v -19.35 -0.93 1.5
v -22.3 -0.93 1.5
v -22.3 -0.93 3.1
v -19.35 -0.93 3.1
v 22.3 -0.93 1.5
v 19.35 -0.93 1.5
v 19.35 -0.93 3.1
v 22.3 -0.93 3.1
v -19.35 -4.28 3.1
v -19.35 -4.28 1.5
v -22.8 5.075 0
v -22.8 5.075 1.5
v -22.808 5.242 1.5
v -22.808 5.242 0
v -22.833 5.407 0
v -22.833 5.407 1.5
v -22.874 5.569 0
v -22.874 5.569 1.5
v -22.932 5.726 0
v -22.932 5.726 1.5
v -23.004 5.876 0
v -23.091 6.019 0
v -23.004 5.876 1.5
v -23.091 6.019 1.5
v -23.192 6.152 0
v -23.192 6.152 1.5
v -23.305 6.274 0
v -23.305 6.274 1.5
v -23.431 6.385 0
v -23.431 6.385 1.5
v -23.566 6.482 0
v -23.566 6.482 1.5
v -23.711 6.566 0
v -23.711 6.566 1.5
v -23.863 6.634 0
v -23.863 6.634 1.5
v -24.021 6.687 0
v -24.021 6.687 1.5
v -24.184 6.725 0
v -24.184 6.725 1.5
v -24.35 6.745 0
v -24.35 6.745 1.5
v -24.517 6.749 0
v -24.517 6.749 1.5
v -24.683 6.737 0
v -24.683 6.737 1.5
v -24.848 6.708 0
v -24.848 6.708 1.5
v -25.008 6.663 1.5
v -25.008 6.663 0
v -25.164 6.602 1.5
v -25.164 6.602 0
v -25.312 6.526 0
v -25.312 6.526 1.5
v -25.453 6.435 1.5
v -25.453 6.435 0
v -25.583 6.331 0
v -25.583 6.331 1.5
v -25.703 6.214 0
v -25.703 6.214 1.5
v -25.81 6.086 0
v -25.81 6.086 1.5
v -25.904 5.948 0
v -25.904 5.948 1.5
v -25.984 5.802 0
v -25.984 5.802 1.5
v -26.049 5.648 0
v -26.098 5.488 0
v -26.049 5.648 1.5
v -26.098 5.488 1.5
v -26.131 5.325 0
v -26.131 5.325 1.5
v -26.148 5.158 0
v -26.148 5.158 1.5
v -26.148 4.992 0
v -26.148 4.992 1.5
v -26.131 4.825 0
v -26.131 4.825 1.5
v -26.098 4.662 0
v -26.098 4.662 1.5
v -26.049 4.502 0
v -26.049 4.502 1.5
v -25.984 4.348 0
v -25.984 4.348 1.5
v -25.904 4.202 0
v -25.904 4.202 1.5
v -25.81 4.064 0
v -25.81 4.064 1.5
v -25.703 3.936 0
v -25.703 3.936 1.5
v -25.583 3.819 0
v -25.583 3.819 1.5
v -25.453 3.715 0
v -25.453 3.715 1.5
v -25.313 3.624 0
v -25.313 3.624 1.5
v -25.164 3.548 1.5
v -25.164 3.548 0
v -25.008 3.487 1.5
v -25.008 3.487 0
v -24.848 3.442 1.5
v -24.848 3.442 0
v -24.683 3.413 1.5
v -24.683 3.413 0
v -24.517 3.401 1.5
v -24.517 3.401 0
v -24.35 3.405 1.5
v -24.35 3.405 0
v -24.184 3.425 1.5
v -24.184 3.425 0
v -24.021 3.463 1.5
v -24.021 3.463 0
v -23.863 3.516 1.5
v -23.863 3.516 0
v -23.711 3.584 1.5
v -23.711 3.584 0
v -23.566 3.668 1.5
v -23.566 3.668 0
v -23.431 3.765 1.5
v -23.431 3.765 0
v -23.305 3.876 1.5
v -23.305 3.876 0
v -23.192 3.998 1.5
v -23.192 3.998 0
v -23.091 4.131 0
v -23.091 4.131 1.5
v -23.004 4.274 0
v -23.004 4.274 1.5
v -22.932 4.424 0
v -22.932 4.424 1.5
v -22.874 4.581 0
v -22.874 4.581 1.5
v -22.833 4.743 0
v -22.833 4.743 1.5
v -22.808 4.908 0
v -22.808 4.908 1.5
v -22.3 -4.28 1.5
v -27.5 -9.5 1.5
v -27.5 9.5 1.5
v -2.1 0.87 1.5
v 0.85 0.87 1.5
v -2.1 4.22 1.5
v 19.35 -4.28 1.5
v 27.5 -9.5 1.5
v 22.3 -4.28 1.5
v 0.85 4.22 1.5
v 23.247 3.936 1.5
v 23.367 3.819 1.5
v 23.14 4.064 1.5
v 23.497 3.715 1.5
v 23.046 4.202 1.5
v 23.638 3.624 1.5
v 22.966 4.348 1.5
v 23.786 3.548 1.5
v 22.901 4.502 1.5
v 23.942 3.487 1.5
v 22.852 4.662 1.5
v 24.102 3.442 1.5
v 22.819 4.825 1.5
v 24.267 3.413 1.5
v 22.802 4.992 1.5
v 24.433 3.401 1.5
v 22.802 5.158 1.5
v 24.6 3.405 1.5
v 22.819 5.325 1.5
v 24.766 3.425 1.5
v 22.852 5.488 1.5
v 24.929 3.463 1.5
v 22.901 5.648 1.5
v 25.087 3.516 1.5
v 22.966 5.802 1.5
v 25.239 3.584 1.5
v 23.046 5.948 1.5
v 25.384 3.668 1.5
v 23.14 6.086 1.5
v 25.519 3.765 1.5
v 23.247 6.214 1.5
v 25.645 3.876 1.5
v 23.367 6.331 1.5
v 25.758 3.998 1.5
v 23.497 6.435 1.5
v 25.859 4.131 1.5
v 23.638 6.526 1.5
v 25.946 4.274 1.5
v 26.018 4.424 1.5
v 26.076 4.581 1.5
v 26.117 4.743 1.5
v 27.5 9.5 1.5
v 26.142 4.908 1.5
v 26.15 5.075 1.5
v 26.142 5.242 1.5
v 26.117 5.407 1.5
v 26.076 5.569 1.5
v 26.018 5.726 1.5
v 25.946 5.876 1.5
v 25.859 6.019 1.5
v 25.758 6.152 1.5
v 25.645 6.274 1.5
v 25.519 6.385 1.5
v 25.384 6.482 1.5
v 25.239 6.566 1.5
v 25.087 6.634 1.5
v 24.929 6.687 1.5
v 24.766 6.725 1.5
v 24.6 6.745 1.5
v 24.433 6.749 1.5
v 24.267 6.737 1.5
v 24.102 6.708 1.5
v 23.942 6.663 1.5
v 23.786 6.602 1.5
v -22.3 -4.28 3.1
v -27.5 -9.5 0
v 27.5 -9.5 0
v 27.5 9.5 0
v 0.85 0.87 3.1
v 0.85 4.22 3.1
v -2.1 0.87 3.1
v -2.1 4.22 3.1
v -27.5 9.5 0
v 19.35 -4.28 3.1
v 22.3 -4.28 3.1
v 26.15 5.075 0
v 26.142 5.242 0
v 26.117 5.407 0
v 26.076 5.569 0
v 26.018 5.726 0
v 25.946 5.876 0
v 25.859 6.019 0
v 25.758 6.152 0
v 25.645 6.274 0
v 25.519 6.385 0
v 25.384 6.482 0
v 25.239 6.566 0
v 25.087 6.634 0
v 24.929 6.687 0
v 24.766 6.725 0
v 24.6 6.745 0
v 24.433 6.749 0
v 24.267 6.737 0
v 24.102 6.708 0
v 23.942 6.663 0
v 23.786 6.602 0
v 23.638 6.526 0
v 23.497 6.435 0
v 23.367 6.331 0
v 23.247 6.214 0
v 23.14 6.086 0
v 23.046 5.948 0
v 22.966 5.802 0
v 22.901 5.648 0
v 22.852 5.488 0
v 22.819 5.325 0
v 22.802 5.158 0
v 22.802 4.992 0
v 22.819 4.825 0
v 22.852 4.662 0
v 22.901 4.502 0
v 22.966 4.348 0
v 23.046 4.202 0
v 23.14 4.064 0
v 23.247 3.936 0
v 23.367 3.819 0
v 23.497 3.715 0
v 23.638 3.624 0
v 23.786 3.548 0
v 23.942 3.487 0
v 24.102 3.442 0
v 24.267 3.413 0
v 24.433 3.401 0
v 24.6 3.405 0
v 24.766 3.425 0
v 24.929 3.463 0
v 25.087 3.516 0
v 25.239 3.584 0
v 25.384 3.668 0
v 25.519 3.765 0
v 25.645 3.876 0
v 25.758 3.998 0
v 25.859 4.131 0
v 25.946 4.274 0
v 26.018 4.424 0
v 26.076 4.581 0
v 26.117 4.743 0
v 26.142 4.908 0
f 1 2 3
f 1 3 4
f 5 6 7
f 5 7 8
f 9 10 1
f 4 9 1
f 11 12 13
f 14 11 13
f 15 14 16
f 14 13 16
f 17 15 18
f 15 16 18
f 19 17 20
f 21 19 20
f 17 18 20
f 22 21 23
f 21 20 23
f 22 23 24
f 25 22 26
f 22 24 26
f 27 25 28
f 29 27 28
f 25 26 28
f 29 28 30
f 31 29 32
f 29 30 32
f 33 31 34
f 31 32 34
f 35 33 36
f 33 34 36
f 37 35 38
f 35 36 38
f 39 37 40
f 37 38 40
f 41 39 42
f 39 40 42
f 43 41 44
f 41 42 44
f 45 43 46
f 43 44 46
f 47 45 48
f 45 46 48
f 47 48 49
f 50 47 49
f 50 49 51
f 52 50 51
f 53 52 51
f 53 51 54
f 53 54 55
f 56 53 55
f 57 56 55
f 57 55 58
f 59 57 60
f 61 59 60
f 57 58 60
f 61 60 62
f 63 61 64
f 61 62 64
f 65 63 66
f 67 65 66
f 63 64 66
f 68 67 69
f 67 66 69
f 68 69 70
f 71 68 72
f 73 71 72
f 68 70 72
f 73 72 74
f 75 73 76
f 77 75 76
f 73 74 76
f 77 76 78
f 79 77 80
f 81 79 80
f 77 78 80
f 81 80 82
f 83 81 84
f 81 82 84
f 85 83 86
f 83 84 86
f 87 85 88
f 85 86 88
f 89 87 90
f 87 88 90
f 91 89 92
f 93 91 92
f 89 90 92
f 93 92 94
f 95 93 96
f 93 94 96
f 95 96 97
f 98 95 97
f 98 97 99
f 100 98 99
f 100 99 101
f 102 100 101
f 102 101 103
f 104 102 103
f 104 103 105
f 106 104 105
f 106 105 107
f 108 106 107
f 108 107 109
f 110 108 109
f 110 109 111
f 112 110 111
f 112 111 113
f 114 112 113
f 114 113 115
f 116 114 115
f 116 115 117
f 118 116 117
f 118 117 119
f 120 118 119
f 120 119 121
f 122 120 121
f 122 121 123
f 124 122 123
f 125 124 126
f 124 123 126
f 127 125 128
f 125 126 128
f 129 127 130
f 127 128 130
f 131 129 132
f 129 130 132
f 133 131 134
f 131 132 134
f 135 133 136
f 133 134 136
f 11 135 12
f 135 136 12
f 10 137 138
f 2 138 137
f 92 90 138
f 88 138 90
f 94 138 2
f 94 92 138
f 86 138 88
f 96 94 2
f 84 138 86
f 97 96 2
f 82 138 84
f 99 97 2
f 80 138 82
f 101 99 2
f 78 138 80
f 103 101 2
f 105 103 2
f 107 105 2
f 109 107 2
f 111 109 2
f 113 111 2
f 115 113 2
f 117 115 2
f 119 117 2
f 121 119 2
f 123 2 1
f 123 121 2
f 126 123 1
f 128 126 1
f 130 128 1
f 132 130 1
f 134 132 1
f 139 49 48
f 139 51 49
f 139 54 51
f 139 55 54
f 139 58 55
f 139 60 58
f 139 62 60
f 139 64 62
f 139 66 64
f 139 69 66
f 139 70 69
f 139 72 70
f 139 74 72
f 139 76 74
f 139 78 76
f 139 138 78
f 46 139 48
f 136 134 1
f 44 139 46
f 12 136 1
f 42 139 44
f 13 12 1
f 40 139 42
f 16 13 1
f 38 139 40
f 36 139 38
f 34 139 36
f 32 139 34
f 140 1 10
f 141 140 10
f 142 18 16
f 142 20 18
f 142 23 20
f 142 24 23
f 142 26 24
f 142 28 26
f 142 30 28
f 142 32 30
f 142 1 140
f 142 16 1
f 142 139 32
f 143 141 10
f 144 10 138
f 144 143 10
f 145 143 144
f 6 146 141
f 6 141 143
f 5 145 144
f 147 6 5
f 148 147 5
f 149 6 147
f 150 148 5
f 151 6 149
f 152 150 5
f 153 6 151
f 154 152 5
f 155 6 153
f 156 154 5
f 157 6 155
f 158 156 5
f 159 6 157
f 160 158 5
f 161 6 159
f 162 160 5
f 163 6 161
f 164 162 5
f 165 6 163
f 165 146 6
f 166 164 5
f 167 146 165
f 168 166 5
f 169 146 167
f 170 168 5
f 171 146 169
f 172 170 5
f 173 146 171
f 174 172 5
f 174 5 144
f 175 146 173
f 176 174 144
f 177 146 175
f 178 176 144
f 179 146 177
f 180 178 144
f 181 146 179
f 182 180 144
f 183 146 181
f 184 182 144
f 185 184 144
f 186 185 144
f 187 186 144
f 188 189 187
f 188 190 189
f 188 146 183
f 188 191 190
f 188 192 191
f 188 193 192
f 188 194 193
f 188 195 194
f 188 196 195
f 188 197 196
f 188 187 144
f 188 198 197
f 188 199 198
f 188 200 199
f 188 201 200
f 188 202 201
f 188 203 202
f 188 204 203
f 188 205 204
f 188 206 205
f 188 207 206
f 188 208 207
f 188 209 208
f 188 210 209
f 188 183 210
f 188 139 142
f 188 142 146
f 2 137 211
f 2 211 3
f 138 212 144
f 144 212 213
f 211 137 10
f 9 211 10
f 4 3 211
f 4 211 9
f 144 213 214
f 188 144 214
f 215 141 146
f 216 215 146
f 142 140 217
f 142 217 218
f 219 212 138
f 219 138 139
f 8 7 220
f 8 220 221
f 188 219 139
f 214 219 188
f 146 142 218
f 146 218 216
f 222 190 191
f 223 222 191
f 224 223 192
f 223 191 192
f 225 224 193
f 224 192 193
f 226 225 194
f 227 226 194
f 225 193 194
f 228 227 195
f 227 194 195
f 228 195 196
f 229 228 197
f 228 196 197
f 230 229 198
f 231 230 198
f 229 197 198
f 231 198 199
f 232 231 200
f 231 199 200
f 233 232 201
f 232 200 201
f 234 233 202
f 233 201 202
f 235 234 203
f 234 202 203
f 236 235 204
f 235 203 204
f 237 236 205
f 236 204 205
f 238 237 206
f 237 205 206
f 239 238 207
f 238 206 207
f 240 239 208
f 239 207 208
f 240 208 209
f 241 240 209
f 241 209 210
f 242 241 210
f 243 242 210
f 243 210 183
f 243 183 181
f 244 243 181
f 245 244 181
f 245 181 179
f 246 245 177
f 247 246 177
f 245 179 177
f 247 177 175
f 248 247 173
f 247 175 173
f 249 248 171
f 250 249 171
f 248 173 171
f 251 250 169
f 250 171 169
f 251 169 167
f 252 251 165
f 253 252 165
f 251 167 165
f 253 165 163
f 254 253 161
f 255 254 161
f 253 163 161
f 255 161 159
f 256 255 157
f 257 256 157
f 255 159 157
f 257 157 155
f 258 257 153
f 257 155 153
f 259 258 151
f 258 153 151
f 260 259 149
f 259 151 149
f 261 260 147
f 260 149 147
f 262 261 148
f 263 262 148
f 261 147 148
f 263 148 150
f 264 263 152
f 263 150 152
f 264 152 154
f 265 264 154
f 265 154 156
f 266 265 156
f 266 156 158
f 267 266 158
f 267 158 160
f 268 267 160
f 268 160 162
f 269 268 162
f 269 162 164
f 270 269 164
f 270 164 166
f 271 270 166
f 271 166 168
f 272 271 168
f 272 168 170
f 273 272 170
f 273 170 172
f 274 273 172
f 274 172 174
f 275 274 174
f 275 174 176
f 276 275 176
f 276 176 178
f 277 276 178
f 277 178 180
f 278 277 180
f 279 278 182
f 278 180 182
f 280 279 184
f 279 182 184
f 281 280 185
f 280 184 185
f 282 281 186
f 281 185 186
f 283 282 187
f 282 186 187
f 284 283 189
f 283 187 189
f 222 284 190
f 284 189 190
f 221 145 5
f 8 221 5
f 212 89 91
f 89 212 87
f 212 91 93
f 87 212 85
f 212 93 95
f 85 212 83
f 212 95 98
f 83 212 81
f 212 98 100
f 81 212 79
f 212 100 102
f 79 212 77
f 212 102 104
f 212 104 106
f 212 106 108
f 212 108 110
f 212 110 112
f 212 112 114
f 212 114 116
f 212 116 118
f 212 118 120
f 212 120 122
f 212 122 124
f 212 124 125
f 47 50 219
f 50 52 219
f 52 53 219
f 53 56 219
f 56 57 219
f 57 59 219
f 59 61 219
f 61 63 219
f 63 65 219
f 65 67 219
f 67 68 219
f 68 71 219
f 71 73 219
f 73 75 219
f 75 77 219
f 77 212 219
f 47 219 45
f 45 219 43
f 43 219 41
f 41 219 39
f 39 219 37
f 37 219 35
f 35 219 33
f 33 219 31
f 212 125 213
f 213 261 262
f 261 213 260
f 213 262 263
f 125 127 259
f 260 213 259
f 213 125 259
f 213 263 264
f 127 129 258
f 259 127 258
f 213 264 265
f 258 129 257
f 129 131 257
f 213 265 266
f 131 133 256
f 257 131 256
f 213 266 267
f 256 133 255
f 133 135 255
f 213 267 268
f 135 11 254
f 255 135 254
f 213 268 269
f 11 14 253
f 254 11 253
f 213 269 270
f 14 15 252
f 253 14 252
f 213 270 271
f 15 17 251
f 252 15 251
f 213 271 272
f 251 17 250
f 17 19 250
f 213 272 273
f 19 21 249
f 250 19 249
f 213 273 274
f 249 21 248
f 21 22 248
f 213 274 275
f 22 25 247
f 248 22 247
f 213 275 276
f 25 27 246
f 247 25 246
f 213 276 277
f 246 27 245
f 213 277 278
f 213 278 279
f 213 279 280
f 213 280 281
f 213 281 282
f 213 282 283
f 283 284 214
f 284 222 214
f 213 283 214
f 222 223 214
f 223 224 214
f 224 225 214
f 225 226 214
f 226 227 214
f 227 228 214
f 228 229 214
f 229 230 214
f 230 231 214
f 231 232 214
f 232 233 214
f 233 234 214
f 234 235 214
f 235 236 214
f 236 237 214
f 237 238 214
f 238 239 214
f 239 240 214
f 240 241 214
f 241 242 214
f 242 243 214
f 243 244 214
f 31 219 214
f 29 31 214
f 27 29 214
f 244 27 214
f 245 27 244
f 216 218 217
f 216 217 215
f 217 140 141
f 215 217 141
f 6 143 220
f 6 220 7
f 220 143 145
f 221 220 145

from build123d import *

# Parameters (mm, degrees)
SKETCH1_W           = 55
SKETCH1_H           = 19
BOSS_EXTRUDE1_DEPTH = 1.5
SKETCH2_R           = 1.675
CUT_EXTRUDE1_DEPTH  = 1.5
SKETCH3_W           = 2.95
SKETCH3_H           = 3.35
BOSS_EXTRUDE2_DEPTH = 1.6


with BuildPart() as part:
    # Sketch1 → Boss-Extrude1 (new body)
    with BuildSketch(Plane.XY):
        Rectangle(SKETCH1_W, SKETCH1_H)
    extrude(amount=BOSS_EXTRUDE1_DEPTH)

    # Sketch2 → Cut-Extrude1 (cut)
    with BuildSketch(Plane.XY.offset(1.5)):
        with Locations((-24.475, 5.075)):
            Circle(SKETCH2_R)
        with Locations((24.475, 5.075)):
            Circle(SKETCH2_R)
    extrude(amount=-CUT_EXTRUDE1_DEPTH, mode=Mode.SUBTRACT)

    # Sketch3 → Boss-Extrude2 (add)
    with BuildSketch(Plane.XY.offset(1.5)):
        with Locations((-0.625, 2.545)):
            Rectangle(SKETCH3_W, SKETCH3_H)
        with Locations((20.825, -2.605)):
            Rectangle(SKETCH3_W, SKETCH3_H)
        with Locations((-20.825, -2.605)):
            Rectangle(SKETCH3_W, SKETCH3_H)
    extrude(amount=BOSS_EXTRUDE2_DEPTH)


solid = part.part
